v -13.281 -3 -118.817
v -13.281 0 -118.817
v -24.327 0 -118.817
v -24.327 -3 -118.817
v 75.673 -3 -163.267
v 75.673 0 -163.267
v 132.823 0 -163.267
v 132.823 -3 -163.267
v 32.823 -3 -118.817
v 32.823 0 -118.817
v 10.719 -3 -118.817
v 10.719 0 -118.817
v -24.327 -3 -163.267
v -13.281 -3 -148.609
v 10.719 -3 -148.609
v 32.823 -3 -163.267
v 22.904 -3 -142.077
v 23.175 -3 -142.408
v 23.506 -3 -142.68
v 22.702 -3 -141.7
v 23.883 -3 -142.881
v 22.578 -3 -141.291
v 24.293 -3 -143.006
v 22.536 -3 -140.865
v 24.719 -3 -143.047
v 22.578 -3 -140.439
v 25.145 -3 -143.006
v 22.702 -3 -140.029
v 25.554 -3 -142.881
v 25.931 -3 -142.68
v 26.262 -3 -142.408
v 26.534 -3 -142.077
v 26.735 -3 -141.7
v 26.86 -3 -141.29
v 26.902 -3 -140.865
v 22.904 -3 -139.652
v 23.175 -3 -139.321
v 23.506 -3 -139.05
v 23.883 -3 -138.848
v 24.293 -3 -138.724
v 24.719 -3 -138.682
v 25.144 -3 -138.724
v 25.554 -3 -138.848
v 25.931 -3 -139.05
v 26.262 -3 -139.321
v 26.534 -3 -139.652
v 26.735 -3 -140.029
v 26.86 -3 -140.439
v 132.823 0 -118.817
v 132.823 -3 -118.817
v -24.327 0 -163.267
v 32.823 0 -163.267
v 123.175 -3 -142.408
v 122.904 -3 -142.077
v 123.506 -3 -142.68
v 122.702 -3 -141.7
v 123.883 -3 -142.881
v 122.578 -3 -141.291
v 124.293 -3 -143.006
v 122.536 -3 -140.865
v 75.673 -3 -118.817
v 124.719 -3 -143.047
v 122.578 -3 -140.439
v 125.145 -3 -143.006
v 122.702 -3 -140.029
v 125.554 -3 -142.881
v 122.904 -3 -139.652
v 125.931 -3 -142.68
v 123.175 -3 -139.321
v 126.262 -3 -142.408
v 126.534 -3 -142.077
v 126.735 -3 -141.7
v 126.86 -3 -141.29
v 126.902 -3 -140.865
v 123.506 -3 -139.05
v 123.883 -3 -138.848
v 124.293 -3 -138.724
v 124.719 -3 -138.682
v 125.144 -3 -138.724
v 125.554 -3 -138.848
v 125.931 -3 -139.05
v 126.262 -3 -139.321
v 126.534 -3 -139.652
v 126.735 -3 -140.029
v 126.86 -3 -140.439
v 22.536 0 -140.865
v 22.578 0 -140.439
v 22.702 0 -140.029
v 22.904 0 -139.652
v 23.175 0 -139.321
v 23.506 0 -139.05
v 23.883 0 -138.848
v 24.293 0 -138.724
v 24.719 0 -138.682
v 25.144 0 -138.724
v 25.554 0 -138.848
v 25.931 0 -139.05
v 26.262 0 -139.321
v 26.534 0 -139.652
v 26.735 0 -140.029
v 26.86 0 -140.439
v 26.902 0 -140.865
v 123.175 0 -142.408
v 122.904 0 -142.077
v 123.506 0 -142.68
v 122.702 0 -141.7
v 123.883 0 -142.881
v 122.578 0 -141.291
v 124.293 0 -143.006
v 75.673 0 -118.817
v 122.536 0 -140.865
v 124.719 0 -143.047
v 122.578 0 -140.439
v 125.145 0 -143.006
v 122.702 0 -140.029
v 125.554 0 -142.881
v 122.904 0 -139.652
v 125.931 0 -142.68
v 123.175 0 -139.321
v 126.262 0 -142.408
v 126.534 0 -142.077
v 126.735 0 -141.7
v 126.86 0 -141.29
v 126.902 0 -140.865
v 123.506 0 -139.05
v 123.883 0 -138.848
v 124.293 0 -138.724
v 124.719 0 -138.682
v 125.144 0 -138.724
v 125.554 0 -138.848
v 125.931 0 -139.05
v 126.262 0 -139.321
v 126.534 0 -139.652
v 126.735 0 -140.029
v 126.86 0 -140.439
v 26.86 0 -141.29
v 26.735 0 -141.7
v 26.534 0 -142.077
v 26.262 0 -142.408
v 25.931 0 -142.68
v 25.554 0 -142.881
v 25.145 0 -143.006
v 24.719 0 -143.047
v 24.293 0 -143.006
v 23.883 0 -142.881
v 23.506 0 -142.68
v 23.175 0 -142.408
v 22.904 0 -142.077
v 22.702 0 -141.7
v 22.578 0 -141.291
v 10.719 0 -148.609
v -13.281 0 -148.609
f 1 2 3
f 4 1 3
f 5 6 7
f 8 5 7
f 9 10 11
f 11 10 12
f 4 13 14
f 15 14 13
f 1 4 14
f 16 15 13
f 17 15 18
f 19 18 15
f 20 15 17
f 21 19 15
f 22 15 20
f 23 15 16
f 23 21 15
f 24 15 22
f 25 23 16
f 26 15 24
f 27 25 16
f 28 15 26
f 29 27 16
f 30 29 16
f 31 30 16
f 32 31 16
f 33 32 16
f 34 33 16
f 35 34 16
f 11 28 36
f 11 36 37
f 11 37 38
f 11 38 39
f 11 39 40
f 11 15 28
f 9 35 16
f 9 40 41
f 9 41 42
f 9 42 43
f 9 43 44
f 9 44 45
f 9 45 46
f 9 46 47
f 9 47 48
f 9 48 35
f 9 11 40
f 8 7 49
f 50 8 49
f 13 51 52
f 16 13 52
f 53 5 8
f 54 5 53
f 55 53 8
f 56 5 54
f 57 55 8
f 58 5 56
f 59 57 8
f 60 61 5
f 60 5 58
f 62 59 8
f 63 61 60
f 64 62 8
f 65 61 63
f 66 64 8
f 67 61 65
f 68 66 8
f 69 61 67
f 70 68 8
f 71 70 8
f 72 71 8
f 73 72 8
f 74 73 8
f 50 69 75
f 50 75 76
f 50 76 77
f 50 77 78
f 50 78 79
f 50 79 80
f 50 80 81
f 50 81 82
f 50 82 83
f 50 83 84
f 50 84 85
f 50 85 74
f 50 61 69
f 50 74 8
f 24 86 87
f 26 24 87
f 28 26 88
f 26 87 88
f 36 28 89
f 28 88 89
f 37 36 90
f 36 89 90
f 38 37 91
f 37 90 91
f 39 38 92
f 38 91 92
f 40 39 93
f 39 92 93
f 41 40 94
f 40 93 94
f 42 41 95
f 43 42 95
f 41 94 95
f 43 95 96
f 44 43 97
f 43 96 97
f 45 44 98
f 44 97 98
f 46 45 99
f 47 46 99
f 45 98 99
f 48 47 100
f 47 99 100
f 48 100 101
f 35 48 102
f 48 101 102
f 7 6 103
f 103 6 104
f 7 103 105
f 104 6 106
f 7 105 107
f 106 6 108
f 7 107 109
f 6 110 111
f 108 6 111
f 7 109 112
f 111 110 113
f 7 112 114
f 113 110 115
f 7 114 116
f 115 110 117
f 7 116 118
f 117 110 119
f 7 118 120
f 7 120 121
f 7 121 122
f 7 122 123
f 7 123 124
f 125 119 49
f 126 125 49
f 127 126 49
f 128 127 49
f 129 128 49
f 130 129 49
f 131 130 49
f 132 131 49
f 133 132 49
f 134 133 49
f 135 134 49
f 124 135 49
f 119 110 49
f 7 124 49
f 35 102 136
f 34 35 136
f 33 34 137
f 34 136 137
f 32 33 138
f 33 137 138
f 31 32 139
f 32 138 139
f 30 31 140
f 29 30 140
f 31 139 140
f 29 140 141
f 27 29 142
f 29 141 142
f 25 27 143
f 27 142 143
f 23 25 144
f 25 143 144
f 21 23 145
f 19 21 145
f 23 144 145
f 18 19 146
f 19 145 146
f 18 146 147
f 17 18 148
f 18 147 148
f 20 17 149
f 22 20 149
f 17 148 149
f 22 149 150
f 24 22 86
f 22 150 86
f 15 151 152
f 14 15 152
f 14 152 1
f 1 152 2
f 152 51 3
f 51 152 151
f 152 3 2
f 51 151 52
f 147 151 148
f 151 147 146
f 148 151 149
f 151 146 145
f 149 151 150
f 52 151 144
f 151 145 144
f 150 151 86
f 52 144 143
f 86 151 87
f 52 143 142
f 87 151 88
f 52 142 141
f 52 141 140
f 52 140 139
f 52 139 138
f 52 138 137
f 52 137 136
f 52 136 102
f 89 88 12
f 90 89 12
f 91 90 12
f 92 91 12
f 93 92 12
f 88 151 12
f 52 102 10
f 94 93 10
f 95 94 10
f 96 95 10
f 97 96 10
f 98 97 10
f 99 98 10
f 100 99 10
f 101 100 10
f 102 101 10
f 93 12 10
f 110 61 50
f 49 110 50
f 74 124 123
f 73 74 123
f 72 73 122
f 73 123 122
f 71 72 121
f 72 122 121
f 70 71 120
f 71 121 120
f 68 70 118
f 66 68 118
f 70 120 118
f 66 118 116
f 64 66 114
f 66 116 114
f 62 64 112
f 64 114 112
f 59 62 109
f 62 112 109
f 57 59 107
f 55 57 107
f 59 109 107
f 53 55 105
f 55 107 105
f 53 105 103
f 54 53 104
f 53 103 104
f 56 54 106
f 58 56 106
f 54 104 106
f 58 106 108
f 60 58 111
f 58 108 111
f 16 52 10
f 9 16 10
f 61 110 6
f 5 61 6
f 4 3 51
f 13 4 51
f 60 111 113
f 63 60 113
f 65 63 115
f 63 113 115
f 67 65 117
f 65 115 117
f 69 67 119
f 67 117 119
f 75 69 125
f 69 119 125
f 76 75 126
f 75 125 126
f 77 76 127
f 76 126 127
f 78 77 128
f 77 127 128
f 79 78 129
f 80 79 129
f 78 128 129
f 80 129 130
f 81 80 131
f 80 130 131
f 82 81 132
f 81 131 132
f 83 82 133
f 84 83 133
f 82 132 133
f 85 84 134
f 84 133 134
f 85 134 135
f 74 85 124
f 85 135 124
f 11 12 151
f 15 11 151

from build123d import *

# Parameters (mm, degrees)
F1_DEPTH = 3
F3_W     = 24
F3_H     = 29.7919254476
F4_DEPTH = 3


with BuildPart() as f1:
    # F0 (on Front) → F1 (new body)
    with BuildSketch(Plane.XZ):
        with BuildLine():
            Line((-13.2813095412, -118.8174709678), (-24.3271607906, -118.8174709678))
            Line((-24.3271607906, -118.8174709678), (-24.3271607906, -163.2674709678))
            Line((-24.3271607906, -163.2674709678), (32.8228392094, -163.2674709678))
            Line((32.8228392094, -163.2674709678), (32.8228392094, -118.8174709678))
            Line((32.8228392094, -118.8174709678), (10.7186904588, -118.8174709678))
            Line((10.7186904588, -118.8174709678), (10.7186904588, -124.8657141138))
            ThreePointArc((10.7186904588, -124.8657141138), (16.6070493723, -131.9210724004), (18.7186904417, -140.8648872041))
            ThreePointArc((18.7186904417, -140.8648872041), (24.7185664001, -134.8646391324), (30.7186904365, -140.8646391312))
            ThreePointArc((30.7186904365, -140.8646391312), (24.7192279278, -146.8646391071), (18.7186905328, -140.8657141137))
            ThreePointArc((18.7186904588, -140.8657141138), (-10.2255814512, -158.7542579338), (-13.2813095412, -124.8657141138))
            Line((-13.2813095412, -124.8657141138), (-13.2813095412, -118.8174709678))
        make_face()
        with BuildLine():
            Line((-13.2813095412, -148.6093964154), (-13.2813095412, -124.8657141138))
            ThreePointArc((-13.2813095412, -124.8657141138), (-10.2255814512, -158.7542579338), (18.7186904588, -140.8657141138))
            ThreePointArc((18.7186904588, -140.8657141138), (18.7186904545, -140.8653006589), (18.7186904417, -140.8648872041))
            Line((18.7186904417, -140.8648872041), (10.7186904588, -140.8652179679))
            Line((10.7186904588, -140.8652179679), (10.7186904588, -148.6093964154))
            Line((10.7186904588, -148.6093964154), (-13.2813095412, -148.6093964154))
        make_face()
        with BuildLine():
            ThreePointArc((18.7186904417, -140.8648872041), (16.6070493723, -131.9210724004), (10.7186904588, -124.8657141138))
            Line((10.7186904588, -124.8657141138), (10.7186904588, -140.8652179679))
            Line((10.7186904588, -140.8652179679), (18.7186904417, -140.8648872041))
        make_face()
        with BuildLine():
            ThreePointArc((18.7186904417, -140.8648872041), (18.7186904545, -140.8653006589), (18.7186904588, -140.8657141138))
            ThreePointArc((18.7186905328, -140.8657141137), (24.7192279278, -146.8646391071), (30.7186904365, -140.8646391312))
            ThreePointArc((30.7186904365, -140.8646391312), (24.7185664001, -134.8646391324), (18.7186904417, -140.8648872041))
        make_face()
        with BuildLine():
            ThreePointArc((26.9015029365, -140.8646391312), (24.7187355613, -143.0474516307), (22.5358779384, -140.8647293806))
            ThreePointArc((22.5358779384, -140.8647293806), (24.7186453118, -138.6818266316), (26.9015029365, -140.8646391312))
        make_face(mode=Mode.SUBTRACT)
    extrude(amount=F1_DEPTH)


with BuildPart() as f2_1:
    # F2: copy of F1
    add(f1.part.moved(Location((100, 0, 0))))

    # F3 (on face) → F4 (join)
    with BuildSketch(Plane.XZ.offset(3)):
        with Locations((98.7186904588, -133.7134336916)):
            Rectangle(F3_W, F3_H)
    extrude(amount=-F4_DEPTH)


solid = Compound([f1.part, f2_1.part])
